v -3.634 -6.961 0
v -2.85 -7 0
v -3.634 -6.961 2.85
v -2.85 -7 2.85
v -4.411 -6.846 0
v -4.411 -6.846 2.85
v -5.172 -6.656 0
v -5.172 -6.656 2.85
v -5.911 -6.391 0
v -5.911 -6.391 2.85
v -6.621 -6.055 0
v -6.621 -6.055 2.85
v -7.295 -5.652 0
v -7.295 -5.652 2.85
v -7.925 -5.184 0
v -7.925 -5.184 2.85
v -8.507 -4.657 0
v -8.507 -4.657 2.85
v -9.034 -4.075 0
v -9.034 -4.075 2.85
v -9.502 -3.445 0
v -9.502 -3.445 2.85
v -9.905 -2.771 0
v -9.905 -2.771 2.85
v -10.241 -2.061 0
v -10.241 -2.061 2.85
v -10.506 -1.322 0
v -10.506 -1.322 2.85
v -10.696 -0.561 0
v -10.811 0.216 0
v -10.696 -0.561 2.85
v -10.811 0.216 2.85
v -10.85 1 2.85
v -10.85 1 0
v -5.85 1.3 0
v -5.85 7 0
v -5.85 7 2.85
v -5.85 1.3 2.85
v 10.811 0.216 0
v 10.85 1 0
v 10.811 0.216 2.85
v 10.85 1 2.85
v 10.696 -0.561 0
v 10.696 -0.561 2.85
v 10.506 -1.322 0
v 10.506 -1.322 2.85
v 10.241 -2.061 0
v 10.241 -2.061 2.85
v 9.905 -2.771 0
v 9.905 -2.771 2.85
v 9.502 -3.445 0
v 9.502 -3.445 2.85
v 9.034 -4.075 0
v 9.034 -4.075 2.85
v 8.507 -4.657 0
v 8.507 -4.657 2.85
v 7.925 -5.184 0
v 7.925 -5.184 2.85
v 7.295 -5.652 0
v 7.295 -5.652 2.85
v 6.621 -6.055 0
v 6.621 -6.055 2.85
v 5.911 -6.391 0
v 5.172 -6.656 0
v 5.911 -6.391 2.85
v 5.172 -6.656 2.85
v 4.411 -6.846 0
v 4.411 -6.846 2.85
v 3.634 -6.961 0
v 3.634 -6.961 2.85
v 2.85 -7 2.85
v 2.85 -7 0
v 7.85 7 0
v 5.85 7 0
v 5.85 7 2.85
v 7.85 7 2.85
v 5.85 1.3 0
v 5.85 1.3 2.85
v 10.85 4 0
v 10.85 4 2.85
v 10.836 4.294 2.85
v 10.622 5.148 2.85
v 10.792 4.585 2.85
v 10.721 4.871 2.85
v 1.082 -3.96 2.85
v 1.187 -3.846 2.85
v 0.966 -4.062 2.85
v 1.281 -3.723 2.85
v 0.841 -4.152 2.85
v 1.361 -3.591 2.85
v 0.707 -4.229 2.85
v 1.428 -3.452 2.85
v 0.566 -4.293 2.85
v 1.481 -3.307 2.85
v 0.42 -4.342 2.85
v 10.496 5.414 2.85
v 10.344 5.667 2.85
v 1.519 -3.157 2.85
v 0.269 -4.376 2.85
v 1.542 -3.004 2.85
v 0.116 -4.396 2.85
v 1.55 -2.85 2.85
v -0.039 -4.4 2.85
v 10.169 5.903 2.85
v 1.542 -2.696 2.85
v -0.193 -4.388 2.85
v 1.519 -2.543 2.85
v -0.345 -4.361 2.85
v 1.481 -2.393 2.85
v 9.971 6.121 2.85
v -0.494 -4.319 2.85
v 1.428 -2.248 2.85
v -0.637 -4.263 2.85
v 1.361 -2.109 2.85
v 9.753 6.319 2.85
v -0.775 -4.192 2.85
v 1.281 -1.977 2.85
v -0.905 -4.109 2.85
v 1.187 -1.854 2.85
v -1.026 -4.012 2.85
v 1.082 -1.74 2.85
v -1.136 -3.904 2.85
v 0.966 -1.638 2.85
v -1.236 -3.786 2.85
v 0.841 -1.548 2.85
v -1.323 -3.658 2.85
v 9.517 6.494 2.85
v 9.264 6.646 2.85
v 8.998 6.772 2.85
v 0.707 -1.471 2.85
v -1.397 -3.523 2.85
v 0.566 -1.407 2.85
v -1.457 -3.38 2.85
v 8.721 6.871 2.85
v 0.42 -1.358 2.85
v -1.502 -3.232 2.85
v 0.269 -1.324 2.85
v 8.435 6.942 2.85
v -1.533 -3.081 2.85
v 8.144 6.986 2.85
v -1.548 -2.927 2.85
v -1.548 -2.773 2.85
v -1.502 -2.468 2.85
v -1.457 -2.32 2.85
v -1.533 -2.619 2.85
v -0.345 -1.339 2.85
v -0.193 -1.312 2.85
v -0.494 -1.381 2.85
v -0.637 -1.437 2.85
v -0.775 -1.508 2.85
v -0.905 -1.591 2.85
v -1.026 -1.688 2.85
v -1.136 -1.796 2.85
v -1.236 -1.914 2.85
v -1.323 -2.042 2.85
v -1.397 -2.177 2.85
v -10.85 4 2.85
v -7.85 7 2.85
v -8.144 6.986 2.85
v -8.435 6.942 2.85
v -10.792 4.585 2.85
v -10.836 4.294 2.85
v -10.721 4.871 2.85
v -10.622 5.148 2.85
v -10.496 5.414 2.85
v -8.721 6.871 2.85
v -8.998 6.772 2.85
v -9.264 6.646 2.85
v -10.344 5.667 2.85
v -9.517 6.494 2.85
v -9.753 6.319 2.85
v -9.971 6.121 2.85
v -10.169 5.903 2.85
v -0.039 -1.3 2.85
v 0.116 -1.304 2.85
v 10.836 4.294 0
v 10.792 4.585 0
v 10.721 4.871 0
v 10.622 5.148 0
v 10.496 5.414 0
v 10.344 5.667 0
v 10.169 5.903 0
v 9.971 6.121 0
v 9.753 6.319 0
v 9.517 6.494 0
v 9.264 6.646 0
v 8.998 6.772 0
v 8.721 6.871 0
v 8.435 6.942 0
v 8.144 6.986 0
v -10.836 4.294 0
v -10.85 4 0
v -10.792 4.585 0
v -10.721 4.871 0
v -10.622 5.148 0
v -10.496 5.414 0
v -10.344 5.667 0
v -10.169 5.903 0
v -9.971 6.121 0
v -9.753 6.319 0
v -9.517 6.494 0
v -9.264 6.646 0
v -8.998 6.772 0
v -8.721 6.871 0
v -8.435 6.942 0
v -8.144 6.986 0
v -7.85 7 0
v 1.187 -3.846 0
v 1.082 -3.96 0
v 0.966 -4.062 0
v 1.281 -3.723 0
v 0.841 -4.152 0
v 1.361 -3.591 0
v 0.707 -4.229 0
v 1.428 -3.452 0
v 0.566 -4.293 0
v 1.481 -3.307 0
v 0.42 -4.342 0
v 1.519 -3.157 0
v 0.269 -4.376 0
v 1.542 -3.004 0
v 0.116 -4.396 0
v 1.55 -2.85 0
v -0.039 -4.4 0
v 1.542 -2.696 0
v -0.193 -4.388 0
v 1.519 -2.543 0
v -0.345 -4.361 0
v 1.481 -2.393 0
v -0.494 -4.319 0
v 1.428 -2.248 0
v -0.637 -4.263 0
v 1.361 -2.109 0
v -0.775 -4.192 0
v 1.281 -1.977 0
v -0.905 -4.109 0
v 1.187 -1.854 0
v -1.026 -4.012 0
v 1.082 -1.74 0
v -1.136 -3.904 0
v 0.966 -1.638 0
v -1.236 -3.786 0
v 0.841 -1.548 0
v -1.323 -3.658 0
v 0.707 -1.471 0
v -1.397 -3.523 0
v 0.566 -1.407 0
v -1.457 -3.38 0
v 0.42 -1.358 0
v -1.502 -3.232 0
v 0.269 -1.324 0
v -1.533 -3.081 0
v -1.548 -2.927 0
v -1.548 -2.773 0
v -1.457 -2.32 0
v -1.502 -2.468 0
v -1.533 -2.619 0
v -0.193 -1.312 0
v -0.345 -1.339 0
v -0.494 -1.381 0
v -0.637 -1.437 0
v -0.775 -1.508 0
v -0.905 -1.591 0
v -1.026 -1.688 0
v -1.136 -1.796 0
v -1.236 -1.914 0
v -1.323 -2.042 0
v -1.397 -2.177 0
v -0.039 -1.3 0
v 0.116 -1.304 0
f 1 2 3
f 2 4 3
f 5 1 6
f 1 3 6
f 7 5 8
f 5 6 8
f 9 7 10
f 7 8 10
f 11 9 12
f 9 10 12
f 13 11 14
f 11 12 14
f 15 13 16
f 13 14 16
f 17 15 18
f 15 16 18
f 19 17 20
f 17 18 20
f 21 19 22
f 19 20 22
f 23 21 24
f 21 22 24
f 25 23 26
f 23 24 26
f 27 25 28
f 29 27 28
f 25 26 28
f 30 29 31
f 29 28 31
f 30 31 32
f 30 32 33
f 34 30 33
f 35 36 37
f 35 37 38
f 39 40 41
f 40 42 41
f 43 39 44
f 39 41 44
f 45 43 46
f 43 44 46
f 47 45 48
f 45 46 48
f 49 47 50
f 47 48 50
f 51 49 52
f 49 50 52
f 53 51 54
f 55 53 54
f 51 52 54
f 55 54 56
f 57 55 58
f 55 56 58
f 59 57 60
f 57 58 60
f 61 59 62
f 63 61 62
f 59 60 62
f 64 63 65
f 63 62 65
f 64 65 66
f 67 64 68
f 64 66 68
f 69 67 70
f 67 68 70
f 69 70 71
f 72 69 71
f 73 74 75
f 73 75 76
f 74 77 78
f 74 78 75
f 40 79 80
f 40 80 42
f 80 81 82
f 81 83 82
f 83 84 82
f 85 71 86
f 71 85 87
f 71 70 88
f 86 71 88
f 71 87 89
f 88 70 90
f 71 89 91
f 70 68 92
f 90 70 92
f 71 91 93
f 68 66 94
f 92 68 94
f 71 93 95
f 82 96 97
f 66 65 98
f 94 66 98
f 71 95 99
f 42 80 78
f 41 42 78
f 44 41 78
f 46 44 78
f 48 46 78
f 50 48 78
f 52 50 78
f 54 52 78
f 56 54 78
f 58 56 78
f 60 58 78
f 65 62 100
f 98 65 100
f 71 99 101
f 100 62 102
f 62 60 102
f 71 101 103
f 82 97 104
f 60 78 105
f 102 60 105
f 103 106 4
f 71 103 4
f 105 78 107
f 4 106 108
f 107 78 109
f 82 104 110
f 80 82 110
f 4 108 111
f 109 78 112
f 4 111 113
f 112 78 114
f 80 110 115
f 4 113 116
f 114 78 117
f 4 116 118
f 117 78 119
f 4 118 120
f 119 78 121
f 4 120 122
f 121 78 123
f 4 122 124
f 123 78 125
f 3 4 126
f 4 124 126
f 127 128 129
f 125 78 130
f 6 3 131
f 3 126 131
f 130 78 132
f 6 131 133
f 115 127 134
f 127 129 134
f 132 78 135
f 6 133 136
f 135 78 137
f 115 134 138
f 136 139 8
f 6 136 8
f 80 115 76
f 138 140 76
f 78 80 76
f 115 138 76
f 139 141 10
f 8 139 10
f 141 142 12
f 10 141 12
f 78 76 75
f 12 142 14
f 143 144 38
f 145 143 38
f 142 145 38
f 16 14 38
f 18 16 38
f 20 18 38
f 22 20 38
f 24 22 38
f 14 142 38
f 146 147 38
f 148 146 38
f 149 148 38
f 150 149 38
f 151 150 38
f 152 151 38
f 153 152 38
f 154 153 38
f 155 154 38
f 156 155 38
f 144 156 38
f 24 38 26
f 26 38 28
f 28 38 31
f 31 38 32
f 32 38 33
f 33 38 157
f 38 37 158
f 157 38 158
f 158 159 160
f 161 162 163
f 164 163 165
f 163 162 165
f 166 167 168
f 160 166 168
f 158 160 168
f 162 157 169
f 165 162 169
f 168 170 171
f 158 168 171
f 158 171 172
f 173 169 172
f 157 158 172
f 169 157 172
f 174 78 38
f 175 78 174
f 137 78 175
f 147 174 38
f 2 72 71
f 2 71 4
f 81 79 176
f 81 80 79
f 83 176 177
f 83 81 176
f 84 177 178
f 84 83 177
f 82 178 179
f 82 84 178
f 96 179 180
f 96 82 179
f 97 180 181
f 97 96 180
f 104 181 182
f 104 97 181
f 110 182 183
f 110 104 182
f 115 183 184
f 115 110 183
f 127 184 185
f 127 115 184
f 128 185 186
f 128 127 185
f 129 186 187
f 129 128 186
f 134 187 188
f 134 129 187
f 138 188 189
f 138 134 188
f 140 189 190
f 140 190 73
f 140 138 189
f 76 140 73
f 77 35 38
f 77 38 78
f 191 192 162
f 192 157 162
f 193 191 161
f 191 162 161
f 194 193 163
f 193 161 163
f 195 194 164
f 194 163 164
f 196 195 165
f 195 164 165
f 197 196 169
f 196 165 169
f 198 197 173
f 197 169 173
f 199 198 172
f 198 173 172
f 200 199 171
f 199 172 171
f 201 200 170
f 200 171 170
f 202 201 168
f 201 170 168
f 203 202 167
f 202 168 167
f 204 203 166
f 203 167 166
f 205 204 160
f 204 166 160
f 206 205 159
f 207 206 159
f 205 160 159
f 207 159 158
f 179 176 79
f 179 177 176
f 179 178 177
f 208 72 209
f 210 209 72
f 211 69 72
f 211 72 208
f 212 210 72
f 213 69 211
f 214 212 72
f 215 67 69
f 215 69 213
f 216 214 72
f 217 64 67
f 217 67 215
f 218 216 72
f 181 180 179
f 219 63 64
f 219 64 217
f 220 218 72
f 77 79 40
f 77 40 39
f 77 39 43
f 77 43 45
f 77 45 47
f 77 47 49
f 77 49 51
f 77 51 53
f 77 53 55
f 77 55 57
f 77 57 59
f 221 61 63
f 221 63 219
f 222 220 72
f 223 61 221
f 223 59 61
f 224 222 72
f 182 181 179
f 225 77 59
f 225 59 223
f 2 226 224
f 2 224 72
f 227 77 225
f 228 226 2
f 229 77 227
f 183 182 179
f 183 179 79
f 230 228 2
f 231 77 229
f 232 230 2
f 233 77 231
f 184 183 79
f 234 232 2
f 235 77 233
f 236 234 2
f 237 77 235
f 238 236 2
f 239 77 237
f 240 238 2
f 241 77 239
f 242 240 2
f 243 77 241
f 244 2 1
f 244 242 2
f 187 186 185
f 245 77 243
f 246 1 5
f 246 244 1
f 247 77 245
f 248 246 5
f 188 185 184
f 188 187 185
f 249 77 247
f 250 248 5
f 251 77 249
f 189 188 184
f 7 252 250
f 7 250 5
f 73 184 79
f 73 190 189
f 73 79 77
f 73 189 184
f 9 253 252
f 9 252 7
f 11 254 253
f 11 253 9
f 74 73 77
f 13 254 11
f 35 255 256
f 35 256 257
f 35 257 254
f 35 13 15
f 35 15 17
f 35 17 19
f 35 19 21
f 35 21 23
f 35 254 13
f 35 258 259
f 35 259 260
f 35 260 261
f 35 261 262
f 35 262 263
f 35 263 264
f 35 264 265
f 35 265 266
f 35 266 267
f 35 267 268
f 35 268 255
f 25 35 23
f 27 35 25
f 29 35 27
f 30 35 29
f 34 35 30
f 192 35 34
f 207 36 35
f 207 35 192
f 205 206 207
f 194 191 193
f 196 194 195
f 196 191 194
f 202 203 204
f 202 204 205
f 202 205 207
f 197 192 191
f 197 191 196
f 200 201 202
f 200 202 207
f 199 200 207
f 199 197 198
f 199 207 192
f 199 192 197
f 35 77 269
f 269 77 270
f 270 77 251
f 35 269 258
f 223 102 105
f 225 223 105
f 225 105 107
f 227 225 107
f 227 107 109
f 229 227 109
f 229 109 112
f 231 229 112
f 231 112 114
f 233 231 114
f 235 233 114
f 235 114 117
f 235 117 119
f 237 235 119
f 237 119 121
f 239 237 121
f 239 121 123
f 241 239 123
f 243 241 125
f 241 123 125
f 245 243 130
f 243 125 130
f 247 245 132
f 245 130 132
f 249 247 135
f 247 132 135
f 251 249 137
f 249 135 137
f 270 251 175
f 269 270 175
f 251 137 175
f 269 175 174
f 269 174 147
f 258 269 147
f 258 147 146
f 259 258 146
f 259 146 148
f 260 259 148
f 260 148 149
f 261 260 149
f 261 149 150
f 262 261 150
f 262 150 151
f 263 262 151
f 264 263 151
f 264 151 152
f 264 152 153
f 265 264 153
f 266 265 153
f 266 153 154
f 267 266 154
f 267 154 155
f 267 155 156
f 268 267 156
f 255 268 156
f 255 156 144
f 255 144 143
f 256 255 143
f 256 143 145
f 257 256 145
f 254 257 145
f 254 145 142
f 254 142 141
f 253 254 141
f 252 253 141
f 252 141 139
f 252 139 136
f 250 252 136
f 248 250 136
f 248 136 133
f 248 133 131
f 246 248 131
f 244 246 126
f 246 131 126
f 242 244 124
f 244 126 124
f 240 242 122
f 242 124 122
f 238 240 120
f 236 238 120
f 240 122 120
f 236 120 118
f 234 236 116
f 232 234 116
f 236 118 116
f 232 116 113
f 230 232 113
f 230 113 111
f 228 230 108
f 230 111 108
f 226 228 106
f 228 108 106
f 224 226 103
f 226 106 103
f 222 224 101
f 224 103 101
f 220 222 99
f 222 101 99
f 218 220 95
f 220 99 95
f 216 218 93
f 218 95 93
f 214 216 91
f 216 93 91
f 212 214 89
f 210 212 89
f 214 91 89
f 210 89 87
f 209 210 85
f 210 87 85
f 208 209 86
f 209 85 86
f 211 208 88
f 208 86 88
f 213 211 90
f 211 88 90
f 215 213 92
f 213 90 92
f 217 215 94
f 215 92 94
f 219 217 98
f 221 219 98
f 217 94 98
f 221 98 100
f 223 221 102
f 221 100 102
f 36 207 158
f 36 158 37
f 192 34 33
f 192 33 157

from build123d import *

# Parameters (mm, degrees)
BOSS_EXTRUDE1_DEPTH = 2.85
SKETCH2_R           = 1.55
CUT_EXTRUDE1_DEPTH  = 14.222896808
FILLET1_R           = 8
FILLET2_R           = 3


with BuildPart() as part:
    # Sketch1 → Boss-Extrude1 (new body)
    with BuildSketch(Plane.XY):
        Polygon((5.85, 7), (10.85, 7), (10.85, -7), (-10.85, -7), (-10.85, 7), (-5.85, 7), (-5.85, 1.3), (5.85, 1.3), align=None)
    extrude(amount=BOSS_EXTRUDE1_DEPTH)

    # Sketch2 → Cut-Extrude1 (cut, through all)
    with BuildSketch(Plane.XY.offset(2.85)):
        with Locations((0, -2.85)):
            Circle(SKETCH2_R)
    extrude(amount=-CUT_EXTRUDE1_DEPTH, mode=Mode.SUBTRACT)

    # Fillet1
    fillet1_edges = [part.edges().sort_by_distance(p)[0] for p in [
        (10.85, -7, 1.425),
        (-10.85, -7, 1.425),
    ]]
    fillet(fillet1_edges, radius=FILLET1_R)

    # Fillet2
    fillet2_edges = [part.edges().sort_by_distance(p)[0] for p in [
        (-10.85, 7, 1.425),
        (10.85, 7, 1.425),
    ]]
    fillet(fillet2_edges, radius=FILLET2_R)


solid = part.part
